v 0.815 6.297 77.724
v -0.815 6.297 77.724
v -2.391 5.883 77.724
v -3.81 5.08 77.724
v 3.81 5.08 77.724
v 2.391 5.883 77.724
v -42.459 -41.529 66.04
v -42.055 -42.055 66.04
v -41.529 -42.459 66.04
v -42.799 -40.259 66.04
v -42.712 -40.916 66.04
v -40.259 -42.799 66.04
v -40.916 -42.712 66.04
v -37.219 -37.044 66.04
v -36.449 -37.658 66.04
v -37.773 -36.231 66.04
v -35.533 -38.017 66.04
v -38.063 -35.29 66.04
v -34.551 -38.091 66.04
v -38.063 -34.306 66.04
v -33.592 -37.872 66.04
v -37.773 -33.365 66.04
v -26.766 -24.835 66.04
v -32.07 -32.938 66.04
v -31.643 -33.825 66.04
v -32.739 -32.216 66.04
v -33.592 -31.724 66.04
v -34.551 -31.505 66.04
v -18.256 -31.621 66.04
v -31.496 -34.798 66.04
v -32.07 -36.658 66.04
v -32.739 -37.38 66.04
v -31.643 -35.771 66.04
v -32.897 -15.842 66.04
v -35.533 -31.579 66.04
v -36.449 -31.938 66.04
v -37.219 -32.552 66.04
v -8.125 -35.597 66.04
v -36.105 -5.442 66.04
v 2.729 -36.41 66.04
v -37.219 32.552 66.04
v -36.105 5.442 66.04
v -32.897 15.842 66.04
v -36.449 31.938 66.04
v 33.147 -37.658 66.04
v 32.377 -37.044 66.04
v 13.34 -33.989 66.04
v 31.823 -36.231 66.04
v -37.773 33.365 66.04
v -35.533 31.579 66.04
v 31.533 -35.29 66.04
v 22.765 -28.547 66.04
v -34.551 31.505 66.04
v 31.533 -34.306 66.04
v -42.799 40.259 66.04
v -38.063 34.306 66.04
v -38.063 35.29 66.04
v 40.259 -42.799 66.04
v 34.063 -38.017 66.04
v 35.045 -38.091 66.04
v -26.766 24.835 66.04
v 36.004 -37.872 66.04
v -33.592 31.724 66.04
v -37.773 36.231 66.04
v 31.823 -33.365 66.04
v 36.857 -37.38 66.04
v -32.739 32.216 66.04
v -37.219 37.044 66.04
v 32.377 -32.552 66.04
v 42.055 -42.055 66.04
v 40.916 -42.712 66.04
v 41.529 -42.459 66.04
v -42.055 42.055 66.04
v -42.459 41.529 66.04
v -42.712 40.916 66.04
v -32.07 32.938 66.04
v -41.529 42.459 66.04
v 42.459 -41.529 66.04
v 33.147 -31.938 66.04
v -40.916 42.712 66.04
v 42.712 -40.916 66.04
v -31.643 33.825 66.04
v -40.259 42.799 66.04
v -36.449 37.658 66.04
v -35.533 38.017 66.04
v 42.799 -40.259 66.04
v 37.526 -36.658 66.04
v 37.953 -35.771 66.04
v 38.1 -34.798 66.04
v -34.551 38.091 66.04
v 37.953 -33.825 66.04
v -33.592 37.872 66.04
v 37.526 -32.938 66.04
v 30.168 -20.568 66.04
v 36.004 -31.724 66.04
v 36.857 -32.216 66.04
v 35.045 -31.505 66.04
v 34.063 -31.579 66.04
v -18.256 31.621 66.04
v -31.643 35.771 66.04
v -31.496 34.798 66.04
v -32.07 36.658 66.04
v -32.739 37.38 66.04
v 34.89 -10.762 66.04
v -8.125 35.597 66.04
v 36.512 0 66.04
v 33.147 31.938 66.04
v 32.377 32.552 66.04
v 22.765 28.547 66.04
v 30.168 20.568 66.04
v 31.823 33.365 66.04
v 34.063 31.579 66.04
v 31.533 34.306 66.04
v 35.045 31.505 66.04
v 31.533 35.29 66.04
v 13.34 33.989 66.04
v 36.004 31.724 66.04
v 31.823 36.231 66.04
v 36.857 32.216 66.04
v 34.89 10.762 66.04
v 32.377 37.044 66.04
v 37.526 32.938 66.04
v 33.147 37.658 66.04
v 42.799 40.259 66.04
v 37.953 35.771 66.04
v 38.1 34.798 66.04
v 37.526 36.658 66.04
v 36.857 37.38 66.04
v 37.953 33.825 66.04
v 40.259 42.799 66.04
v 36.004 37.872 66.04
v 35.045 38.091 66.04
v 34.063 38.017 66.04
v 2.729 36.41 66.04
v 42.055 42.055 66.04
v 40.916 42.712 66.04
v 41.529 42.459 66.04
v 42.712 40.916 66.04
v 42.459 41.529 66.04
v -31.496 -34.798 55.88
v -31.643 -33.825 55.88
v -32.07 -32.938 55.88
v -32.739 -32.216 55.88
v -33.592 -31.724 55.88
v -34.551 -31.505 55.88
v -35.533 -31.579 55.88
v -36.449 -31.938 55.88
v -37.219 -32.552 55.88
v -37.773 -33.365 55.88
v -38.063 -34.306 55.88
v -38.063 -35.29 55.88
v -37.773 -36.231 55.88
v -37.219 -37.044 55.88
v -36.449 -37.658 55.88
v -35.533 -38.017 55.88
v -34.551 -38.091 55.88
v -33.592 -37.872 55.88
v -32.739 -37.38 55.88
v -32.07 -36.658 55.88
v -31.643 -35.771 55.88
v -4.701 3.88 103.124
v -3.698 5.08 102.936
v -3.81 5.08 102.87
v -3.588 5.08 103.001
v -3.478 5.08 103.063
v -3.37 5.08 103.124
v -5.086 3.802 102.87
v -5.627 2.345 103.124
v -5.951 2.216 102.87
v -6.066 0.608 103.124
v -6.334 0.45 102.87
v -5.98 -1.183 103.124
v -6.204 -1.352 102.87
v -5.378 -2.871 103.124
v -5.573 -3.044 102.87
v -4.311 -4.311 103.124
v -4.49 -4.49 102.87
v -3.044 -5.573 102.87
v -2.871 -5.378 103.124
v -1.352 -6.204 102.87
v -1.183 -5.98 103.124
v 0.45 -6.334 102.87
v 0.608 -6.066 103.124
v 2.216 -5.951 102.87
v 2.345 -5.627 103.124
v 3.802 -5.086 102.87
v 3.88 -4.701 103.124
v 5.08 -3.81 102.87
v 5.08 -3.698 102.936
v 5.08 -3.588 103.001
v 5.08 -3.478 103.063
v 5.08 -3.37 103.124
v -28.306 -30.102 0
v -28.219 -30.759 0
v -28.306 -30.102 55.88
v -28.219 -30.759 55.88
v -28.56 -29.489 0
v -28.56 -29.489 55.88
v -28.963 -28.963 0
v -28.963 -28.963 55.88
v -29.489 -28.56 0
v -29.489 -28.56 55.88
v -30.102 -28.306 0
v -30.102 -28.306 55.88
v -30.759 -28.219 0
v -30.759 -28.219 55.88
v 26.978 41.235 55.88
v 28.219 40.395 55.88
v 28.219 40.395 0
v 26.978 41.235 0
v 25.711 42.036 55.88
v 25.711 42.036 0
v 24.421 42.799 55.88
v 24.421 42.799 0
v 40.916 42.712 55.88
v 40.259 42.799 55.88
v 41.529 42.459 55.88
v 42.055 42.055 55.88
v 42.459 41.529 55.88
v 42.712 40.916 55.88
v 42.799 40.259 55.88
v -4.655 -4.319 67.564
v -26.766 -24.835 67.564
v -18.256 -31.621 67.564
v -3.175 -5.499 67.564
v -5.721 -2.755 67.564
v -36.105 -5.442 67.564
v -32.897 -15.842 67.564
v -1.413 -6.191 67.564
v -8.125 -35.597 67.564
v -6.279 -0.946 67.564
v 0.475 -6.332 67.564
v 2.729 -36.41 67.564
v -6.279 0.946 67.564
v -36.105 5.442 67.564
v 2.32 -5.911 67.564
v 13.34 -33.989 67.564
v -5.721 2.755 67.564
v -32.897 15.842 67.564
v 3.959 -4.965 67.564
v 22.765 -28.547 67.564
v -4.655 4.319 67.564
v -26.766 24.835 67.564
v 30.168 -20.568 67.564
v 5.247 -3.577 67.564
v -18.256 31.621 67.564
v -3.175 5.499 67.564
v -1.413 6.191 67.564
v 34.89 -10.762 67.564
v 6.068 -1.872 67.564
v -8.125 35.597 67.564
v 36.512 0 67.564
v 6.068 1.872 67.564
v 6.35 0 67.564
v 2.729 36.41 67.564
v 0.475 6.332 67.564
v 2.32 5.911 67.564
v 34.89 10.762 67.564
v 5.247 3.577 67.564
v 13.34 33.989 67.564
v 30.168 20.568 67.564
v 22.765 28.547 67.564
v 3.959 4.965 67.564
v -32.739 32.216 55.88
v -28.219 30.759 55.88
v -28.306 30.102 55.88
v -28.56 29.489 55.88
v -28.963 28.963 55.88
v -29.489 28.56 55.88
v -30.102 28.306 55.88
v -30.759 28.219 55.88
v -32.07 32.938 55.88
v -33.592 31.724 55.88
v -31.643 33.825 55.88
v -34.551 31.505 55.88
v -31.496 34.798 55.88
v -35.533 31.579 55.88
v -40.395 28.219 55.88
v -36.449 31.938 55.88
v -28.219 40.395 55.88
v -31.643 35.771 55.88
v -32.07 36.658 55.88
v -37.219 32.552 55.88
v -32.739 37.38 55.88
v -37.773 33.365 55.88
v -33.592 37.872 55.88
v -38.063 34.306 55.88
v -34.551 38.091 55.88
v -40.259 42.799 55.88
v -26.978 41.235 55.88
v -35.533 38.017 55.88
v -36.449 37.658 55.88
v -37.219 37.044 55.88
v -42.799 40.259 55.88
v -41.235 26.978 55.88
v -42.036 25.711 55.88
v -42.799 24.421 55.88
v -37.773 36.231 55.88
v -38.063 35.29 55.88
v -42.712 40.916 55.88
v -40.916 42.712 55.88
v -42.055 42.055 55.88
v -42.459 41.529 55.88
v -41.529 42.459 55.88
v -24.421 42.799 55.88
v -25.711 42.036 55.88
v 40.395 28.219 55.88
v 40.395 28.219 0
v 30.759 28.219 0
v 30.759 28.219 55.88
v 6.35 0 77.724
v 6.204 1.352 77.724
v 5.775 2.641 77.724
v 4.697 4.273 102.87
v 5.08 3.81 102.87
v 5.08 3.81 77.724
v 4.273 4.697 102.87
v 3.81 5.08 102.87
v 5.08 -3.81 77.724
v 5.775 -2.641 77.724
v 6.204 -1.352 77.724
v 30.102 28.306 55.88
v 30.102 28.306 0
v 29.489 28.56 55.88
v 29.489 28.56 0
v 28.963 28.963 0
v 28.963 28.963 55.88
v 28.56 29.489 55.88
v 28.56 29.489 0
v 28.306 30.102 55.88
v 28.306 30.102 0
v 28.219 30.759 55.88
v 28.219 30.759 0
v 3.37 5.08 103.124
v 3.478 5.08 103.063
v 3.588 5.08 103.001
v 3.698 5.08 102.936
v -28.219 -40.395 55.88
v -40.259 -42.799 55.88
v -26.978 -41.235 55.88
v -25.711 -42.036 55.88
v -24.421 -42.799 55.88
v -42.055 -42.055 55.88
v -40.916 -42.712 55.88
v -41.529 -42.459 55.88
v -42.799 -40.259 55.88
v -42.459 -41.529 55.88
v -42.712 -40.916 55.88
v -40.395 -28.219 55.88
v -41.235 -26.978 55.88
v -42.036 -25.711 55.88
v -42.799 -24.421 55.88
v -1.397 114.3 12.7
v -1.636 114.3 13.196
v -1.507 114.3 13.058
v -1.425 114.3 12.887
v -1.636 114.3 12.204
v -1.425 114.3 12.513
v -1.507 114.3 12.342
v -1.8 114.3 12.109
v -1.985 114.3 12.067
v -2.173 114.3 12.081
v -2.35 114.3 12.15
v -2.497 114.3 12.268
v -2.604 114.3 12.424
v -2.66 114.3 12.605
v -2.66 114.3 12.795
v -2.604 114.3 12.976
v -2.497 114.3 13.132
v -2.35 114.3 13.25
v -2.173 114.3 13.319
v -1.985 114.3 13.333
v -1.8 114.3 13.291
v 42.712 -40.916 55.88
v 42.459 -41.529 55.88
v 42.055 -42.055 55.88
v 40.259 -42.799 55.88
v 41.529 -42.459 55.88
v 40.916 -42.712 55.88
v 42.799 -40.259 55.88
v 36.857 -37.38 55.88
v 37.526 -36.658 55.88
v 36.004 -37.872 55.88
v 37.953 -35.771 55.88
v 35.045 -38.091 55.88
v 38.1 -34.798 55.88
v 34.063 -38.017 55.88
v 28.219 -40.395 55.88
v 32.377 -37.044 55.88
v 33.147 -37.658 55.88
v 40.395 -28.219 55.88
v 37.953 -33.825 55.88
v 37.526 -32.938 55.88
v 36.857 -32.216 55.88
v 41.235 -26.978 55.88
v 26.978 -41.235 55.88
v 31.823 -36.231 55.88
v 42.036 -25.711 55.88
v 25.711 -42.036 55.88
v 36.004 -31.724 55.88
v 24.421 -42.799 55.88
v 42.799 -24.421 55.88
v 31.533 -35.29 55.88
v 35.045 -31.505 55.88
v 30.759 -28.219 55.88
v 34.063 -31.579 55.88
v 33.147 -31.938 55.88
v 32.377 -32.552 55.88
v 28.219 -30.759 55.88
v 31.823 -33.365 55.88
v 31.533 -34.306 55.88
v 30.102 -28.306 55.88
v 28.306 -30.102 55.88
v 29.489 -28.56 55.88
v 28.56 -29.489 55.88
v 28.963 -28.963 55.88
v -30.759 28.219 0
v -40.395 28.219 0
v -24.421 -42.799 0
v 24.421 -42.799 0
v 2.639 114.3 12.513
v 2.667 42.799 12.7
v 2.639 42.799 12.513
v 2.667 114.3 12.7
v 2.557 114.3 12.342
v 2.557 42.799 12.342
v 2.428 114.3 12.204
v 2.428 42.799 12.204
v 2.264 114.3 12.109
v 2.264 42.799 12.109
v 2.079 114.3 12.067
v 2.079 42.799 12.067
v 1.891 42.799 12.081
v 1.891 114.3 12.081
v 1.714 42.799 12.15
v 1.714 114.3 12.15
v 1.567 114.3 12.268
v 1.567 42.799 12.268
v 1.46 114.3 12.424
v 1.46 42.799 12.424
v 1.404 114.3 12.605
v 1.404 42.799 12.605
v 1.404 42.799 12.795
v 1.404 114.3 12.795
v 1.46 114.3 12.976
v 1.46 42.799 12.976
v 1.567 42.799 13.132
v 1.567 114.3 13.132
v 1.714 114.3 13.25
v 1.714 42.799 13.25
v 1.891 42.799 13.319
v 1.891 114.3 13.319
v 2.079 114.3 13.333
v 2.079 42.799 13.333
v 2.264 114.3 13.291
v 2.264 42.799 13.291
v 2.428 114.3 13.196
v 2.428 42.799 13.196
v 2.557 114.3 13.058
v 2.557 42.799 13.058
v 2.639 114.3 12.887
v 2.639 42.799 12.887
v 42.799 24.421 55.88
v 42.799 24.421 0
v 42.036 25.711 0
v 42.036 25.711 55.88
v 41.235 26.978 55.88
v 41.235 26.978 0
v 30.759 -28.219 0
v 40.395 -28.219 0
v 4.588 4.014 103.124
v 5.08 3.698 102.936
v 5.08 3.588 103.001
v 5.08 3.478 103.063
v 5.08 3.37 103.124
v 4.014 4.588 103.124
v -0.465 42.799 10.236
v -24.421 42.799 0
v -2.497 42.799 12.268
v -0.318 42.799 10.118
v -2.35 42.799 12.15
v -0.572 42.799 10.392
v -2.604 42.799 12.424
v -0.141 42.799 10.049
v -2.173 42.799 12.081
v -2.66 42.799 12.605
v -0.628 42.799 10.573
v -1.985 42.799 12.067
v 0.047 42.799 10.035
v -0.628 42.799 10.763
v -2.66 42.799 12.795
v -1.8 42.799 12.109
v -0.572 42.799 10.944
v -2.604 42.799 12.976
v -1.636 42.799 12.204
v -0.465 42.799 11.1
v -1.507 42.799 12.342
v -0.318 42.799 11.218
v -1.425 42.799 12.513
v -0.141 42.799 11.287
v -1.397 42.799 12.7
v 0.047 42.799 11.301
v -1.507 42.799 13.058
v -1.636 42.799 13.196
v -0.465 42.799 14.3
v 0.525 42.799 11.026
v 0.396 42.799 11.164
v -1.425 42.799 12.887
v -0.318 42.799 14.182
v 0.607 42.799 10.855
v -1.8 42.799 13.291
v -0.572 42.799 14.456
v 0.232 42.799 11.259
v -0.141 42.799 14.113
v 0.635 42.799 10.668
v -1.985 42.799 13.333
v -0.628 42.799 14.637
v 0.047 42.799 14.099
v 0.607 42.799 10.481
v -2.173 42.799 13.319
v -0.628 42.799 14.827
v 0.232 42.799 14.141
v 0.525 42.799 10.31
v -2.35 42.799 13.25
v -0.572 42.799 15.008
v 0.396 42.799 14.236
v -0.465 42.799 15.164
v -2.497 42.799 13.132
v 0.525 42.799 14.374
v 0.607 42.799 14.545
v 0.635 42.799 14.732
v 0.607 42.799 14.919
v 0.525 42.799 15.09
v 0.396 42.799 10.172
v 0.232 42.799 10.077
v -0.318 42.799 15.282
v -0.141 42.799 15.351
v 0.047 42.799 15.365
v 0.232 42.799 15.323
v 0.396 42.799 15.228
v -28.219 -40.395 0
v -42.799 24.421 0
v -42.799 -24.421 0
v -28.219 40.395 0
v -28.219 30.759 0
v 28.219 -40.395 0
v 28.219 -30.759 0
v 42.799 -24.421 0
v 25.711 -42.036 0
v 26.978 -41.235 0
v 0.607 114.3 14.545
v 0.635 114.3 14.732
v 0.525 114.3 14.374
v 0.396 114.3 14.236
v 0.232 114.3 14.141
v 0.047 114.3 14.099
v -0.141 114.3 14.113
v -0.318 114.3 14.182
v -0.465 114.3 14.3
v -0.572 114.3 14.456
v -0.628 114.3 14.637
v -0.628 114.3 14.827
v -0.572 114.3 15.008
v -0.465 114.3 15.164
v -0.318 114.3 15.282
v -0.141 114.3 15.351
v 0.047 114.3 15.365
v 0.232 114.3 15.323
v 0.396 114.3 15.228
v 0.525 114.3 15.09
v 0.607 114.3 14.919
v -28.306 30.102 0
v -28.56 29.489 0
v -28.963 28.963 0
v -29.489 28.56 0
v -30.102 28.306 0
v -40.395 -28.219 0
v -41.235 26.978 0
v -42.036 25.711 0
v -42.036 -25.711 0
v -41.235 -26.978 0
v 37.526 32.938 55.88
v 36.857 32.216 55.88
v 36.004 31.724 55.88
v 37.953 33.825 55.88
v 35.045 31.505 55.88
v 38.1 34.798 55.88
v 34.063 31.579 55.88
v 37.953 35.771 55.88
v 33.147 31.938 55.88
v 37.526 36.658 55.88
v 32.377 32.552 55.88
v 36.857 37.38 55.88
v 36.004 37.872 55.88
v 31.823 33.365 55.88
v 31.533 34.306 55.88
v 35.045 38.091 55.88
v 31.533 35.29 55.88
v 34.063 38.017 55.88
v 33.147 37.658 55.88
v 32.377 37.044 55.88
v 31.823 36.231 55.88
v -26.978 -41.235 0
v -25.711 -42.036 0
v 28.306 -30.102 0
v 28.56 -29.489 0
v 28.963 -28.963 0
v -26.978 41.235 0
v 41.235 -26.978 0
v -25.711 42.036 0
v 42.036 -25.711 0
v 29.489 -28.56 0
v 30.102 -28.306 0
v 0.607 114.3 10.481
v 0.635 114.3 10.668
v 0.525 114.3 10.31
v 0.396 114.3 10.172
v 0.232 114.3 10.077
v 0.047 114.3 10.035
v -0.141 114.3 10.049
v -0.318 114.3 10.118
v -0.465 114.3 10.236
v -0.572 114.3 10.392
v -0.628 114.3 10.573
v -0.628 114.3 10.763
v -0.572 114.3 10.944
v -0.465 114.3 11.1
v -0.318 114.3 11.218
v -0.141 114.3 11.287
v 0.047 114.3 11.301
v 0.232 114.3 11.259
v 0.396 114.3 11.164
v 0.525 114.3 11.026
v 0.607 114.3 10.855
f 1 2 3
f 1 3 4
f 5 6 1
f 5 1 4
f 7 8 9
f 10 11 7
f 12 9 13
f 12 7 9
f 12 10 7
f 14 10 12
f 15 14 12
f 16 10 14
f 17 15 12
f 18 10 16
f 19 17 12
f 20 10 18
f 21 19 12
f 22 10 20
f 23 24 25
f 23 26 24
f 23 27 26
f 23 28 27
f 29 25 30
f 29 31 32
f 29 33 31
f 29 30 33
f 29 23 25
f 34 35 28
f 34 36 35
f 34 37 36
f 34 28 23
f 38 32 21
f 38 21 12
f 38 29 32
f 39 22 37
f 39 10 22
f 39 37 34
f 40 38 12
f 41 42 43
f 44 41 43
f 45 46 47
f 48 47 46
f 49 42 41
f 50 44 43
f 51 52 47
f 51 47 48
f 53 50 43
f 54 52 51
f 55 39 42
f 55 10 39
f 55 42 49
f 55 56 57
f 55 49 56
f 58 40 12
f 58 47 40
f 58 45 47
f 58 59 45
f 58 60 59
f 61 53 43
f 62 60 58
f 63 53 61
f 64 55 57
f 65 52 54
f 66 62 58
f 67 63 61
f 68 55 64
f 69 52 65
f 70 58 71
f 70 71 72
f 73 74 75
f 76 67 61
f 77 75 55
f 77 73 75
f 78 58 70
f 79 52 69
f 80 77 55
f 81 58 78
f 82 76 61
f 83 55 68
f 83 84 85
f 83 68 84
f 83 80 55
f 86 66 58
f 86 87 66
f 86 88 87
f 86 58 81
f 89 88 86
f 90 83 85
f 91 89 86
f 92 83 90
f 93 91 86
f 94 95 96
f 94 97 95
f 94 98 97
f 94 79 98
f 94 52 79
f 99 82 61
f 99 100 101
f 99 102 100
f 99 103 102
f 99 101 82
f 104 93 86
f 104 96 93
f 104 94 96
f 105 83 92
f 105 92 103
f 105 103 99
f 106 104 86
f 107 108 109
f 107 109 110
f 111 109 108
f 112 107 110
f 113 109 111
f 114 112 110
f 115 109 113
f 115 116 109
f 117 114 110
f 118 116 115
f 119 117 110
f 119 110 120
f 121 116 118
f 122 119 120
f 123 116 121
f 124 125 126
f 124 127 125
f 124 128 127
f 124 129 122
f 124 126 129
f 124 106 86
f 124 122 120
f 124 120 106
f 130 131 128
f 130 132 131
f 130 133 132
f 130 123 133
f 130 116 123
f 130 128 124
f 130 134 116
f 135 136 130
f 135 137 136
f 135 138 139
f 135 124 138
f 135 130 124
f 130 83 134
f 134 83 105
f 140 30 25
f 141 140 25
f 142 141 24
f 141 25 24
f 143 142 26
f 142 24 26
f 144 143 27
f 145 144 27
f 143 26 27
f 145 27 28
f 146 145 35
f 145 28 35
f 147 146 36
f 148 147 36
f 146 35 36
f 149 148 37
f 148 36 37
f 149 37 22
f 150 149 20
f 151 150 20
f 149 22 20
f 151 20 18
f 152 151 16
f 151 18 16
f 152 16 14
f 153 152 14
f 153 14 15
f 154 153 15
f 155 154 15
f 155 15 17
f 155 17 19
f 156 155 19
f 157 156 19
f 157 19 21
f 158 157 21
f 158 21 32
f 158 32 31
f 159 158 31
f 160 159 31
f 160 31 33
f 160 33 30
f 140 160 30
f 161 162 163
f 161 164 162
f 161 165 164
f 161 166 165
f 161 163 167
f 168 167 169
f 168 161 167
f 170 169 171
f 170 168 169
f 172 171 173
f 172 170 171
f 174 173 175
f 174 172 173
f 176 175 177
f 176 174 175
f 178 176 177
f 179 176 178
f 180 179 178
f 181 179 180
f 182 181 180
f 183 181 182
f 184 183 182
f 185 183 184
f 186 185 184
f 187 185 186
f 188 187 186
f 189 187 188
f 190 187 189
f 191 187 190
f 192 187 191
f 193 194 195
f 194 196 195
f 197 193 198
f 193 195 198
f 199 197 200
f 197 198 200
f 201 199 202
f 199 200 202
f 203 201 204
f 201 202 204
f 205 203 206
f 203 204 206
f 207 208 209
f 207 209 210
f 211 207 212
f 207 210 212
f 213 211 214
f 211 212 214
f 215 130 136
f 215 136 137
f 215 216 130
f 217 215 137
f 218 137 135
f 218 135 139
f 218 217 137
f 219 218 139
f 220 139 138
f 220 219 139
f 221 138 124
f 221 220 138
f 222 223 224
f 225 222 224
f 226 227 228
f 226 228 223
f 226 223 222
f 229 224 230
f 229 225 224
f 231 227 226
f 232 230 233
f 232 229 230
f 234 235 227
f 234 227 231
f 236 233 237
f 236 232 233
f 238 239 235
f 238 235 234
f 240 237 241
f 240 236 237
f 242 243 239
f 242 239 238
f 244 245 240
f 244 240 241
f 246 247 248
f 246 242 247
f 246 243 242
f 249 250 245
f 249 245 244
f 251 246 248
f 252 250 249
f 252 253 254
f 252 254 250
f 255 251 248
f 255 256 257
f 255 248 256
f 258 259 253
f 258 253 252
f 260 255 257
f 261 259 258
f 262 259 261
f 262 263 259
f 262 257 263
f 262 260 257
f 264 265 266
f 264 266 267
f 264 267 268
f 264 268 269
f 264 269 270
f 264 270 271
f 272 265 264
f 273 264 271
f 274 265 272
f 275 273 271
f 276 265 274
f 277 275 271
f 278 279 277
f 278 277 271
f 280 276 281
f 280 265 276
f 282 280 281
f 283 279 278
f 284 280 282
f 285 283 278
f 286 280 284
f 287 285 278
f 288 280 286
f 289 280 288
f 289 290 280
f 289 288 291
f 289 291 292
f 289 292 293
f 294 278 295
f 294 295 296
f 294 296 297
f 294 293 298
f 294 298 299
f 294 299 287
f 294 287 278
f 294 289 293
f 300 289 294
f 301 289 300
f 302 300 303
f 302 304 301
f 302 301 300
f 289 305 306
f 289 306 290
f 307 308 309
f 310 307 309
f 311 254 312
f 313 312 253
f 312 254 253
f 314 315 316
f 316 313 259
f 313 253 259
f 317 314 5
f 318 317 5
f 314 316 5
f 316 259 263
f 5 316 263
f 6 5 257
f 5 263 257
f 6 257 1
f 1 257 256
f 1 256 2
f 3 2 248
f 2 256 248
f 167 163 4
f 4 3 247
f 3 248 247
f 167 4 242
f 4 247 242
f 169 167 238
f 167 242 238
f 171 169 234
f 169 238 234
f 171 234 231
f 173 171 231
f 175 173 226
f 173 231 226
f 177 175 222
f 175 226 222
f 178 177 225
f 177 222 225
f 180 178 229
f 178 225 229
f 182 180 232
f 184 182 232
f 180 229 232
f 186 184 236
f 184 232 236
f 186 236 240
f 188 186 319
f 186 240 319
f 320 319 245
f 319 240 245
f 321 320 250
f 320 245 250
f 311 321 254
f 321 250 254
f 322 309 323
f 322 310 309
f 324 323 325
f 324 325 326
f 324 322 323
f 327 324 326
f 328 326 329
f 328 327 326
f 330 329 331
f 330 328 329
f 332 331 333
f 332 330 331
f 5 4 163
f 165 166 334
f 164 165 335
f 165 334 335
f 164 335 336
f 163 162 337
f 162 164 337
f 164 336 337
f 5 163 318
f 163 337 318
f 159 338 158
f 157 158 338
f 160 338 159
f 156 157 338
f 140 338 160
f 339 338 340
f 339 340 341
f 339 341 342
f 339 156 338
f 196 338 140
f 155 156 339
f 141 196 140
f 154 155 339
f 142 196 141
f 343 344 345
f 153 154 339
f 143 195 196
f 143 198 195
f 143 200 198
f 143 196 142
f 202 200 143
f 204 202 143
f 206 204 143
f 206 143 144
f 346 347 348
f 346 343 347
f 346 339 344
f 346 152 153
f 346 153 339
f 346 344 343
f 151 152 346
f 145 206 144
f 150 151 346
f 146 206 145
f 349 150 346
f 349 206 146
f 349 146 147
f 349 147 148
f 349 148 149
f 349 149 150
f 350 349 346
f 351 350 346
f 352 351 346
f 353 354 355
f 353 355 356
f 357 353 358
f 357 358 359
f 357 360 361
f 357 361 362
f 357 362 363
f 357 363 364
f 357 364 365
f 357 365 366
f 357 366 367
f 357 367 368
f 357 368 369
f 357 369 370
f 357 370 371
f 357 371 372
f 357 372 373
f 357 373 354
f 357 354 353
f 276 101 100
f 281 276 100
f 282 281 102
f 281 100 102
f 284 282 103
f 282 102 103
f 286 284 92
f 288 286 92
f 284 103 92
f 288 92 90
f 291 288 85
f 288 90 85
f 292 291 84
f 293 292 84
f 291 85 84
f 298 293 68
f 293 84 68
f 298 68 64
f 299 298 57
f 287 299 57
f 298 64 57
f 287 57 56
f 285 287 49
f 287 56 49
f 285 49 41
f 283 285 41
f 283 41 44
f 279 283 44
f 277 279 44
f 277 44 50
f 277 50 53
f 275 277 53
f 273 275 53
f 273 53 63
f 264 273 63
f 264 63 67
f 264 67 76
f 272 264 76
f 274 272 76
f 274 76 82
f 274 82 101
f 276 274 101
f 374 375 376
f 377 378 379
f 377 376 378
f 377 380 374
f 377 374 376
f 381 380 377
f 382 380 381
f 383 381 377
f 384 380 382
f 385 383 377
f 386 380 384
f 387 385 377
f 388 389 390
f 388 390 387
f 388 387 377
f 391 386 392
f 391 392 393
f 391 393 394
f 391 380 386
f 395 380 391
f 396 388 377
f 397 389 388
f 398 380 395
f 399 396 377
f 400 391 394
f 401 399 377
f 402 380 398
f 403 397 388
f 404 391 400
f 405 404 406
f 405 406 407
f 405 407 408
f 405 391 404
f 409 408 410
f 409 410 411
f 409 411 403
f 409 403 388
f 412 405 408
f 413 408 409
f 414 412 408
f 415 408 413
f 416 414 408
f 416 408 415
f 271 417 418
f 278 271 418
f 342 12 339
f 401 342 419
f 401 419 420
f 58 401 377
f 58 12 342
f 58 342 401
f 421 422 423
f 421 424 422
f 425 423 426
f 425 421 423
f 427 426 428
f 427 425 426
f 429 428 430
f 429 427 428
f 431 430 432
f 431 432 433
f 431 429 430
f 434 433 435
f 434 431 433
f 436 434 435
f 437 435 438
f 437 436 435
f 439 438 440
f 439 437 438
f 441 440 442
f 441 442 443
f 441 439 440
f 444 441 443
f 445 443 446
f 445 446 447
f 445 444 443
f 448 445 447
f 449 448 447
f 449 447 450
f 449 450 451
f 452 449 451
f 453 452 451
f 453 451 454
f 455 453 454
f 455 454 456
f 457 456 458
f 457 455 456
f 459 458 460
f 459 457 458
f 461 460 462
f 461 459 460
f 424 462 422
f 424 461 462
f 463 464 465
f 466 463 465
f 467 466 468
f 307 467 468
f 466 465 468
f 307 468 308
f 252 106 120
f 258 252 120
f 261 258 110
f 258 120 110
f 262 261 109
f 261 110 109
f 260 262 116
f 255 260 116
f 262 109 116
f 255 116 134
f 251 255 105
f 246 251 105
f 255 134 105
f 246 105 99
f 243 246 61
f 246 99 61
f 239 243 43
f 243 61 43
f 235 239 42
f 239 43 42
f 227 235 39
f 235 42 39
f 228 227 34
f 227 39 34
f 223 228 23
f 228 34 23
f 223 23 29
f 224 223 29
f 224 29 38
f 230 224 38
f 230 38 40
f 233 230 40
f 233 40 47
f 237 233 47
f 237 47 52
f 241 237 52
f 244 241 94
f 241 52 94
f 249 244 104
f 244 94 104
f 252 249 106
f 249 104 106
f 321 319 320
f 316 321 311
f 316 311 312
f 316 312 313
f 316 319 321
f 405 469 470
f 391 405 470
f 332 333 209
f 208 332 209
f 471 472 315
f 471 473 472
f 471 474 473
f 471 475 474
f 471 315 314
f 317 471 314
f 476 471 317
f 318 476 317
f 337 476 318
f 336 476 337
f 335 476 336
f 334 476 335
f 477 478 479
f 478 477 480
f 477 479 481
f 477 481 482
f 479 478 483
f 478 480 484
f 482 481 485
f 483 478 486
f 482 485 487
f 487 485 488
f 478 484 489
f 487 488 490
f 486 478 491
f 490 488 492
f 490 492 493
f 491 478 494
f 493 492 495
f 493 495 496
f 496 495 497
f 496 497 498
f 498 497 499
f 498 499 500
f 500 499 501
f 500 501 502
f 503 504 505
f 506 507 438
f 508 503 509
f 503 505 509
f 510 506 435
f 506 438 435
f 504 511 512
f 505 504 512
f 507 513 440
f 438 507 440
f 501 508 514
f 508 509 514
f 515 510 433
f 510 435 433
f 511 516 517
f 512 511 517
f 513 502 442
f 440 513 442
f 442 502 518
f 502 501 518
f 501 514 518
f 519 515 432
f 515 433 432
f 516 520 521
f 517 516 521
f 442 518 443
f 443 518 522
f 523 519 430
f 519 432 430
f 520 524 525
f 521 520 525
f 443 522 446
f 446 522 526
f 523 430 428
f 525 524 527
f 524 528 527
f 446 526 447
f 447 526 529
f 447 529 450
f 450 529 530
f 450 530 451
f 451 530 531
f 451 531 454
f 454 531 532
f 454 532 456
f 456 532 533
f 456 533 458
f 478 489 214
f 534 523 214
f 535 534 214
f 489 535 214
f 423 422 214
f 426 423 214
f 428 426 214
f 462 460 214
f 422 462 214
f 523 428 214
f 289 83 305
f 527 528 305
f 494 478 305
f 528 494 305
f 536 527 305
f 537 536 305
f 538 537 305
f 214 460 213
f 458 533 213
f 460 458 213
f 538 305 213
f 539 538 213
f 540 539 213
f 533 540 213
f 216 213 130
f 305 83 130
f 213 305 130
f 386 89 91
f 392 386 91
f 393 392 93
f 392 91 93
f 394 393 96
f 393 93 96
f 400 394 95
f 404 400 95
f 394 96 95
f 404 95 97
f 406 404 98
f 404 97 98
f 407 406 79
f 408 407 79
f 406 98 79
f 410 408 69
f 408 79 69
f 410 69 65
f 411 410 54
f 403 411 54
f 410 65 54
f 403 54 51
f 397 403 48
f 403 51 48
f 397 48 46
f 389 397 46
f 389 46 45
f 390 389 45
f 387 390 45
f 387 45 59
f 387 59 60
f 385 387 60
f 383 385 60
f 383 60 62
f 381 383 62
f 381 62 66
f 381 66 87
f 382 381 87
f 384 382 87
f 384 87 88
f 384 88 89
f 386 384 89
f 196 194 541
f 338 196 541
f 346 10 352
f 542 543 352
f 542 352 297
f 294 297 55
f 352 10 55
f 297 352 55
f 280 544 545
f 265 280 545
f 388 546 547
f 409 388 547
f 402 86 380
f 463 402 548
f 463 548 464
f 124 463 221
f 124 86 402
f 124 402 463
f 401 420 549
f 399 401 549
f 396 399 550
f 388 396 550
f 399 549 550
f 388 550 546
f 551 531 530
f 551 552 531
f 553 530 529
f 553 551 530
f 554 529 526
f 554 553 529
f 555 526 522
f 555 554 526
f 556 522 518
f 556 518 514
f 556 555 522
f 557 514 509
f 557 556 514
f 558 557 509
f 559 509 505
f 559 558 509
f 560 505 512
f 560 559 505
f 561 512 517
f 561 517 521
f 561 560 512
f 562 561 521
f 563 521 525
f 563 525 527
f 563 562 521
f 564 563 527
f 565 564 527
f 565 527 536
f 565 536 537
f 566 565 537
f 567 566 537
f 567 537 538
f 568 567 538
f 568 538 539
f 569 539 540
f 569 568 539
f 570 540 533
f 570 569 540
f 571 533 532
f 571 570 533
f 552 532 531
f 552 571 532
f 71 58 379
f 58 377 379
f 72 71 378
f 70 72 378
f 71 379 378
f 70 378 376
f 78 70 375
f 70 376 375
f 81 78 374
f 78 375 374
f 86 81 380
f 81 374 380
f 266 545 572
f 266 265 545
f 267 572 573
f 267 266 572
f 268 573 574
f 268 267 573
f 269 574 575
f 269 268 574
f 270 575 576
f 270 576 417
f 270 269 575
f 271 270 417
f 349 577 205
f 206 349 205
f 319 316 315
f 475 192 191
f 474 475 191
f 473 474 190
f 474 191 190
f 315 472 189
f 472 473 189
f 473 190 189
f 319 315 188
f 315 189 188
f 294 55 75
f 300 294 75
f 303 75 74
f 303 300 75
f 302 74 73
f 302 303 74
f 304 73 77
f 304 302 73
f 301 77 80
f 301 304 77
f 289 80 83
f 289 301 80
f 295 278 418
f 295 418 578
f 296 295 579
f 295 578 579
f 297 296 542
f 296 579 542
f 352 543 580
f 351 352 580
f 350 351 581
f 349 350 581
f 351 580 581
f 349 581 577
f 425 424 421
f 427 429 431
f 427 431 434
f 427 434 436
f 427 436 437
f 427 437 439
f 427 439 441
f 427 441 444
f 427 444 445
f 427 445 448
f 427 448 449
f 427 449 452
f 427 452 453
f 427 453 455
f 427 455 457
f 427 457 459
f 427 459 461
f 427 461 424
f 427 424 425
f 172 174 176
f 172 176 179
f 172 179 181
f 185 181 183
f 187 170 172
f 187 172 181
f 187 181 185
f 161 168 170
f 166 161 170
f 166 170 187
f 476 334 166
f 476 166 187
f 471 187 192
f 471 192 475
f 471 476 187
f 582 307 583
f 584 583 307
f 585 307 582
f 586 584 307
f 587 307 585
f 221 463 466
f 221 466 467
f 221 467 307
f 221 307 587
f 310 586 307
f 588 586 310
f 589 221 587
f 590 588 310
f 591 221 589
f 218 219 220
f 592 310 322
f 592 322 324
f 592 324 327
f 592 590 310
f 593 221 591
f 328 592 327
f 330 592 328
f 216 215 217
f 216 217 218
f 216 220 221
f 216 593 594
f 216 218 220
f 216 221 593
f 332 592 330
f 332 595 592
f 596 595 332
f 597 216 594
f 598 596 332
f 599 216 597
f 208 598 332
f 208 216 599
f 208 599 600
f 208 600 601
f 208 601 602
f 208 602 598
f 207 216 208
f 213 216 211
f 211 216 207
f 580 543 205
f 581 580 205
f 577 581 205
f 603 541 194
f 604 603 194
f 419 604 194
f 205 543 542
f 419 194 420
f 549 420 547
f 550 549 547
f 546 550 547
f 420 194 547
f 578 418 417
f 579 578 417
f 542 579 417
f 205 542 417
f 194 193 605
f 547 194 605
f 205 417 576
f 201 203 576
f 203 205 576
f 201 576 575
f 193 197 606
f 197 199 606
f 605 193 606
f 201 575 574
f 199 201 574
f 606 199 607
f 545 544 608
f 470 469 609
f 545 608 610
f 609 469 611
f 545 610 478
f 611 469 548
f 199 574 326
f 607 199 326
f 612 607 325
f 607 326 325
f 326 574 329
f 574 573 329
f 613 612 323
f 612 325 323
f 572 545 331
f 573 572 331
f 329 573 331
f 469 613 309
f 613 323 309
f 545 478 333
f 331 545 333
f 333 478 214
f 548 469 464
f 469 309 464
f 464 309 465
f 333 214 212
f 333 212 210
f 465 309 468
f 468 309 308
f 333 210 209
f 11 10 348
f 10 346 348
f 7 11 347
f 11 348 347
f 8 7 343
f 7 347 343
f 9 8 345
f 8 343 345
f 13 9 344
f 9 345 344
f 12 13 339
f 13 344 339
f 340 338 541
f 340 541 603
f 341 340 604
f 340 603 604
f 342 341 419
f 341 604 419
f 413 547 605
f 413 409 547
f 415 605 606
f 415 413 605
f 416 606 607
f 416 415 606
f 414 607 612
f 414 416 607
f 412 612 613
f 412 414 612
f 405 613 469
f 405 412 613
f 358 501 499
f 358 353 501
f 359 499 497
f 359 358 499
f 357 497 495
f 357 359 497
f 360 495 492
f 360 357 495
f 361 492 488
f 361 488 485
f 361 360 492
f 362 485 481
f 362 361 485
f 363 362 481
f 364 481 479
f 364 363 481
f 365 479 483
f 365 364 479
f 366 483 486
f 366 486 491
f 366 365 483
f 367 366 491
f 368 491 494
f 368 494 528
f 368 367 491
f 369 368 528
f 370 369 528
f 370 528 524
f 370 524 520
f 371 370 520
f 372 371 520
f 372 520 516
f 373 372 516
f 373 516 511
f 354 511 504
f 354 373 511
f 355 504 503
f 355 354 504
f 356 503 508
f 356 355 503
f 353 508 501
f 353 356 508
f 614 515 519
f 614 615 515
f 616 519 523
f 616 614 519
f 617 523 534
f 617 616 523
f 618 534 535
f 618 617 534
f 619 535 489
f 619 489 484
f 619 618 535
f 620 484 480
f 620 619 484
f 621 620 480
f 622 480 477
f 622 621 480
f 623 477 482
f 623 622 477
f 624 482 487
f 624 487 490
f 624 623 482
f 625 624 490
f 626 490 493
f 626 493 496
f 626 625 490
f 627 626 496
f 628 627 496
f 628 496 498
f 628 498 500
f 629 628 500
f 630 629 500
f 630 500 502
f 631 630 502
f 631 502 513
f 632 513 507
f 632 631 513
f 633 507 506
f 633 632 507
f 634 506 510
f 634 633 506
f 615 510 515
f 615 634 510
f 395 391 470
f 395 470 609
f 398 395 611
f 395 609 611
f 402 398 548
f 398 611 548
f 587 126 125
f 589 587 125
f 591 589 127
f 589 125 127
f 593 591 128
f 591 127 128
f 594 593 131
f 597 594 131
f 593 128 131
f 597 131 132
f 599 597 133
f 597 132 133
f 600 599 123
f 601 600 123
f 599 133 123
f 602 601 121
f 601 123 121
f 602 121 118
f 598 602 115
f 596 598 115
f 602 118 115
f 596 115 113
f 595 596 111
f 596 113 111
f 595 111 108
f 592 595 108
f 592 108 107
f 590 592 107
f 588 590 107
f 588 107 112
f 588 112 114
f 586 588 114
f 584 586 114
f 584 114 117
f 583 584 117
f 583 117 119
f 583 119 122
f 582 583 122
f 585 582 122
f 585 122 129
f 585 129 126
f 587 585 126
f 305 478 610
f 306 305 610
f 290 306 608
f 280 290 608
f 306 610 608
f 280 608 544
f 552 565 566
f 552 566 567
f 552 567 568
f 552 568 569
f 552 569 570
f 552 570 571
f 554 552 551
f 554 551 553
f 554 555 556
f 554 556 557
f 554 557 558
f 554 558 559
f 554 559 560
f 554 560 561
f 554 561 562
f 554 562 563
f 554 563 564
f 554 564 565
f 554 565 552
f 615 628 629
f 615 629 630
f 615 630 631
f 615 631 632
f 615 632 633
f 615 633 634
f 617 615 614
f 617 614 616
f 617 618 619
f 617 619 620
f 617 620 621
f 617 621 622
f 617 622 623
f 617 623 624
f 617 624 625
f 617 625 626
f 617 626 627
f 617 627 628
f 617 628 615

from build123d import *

# Parameters (mm, degrees)
SKETCH1_W           = 85.598
SKETCH1_H           = 85.598
BOSS_EXTRUDE1_DEPTH = 66.04
CUT_EXTRUDE1_DEPTH  = 55.88
CUT_EXTRUDE2_DEPTH  = 55.88
CUT_EXTRUDE3_DEPTH  = 55.88
CUT_EXTRUDE4_DEPTH  = 55.88
CUT_EXTRUDE5_DEPTH  = 55.88
CUT_EXTRUDE6_DEPTH  = 55.88
CUT_EXTRUDE7_DEPTH  = 55.88
CUT_EXTRUDE8_DEPTH  = 55.88
SKETCH10_R          = 36.5125
BOSS_EXTRUDE2_DEPTH = 1.524
SKETCH11_R          = 6.35
BOSS_EXTRUDE3_DEPTH = 35.56
CUT_EXTRUDE9_DEPTH  = 25.4
CUT_EXTRUDE10_DEPTH = 25.4
SKETCH14_W          = 0.635
SKETCH14_H          = 71.501
SKETCH15_W          = 0.635
SKETCH15_H          = 71.501
SKETCH16_W          = 0.635
SKETCH16_H          = 71.501
SKETCH17_W          = 0.635
SKETCH17_H          = 71.501
HOLE1_D             = 6.604
HOLE1_DEPTH         = 47.244
HOLE2_D             = 6.604
HOLE2_DEPTH         = 47.244
HOLE3_D             = 6.604
HOLE3_DEPTH         = 47.244
HOLE4_D             = 6.604
HOLE4_DEPTH         = 47.244
CHAMFER1_SIZE       = 0.254
CHAMFER2_SIZE       = 0.254
FILLET1_R           = 2.54
FILLET2_R           = 2.54
FILLET3_R           = 2.54
FILLET4_R           = 2.54
FILLET5_R           = 2.54
FILLET6_R           = 2.54
FILLET7_R           = 2.54
FILLET8_R           = 2.54


with BuildPart() as part:
    # Sketch1 → Boss-Extrude1 (new body)
    with BuildSketch(Plane.XY.offset(66.04)):
        Rectangle(SKETCH1_W, SKETCH1_H)
    extrude(amount=-BOSS_EXTRUDE1_DEPTH)

    # Sketch2 → Cut-Extrude1 (cut)
    with BuildSketch(Plane(origin=(0, 0, 0), x_dir=(-1, 0, 0), z_dir=(0, 0, -1))):
        with BuildLine():
            Line((-42.799, -42.799), (-24.420683344, -42.799))
            ThreePointArc((-24.420683344, -42.799), (-34.84339375, -34.84339375), (-42.799, -24.420683344))
            Line((-42.799, -24.420683344), (-42.799, -42.799))
        make_face()
    extrude(amount=-CUT_EXTRUDE1_DEPTH, mode=Mode.SUBTRACT)

    # Sketch3 → Cut-Extrude2 (cut)
    with BuildSketch(Plane(origin=(0, 0, 0), x_dir=(-1, 0, 0), z_dir=(0, 0, -1))):
        with BuildLine():
            Line((-28.2194, -40.395416072), (-28.2194, -28.2194))
            Line((-28.2194, -28.2194), (-40.395416072, -28.2194))
            ThreePointArc((-40.395416072, -28.2194), (-34.84339375, -34.84339375), (-28.2194, -40.395416072))
        make_face()
    extrude(amount=-CUT_EXTRUDE2_DEPTH, mode=Mode.SUBTRACT)

    # Sketch4 → Cut-Extrude3 (cut)
    with BuildSketch(Plane(origin=(0, 0, 0), x_dir=(-1, 0, 0), z_dir=(0, 0, -1))):
        with BuildLine():
            Line((-42.799, 42.799), (-42.799, 24.420683344))
            ThreePointArc((-42.799, 24.420683344), (-34.84339375, 34.84339375), (-24.420683344, 42.799))
            Line((-24.420683344, 42.799), (-42.799, 42.799))
        make_face()
    extrude(amount=-CUT_EXTRUDE3_DEPTH, mode=Mode.SUBTRACT)

    # Sketch5 → Cut-Extrude4 (cut)
    with BuildSketch(Plane(origin=(0, 0, 0), x_dir=(-1, 0, 0), z_dir=(0, 0, -1))):
        with BuildLine():
            Line((-40.395416072, 28.2194), (-28.2194, 28.2194))
            Line((-28.2194, 28.2194), (-28.2194, 40.395416072))
            ThreePointArc((-28.2194, 40.395416072), (-34.84339375, 34.84339375), (-40.395416072, 28.2194))
        make_face()
    extrude(amount=-CUT_EXTRUDE4_DEPTH, mode=Mode.SUBTRACT)

    # Sketch6 → Cut-Extrude5 (cut)
    with BuildSketch(Plane(origin=(0, 0, 0), x_dir=(-1, 0, 0), z_dir=(0, 0, -1))):
        with BuildLine():
            Line((42.799, 42.799), (24.420683344, 42.799))
            ThreePointArc((24.420683344, 42.799), (34.84339375, 34.84339375), (42.799, 24.420683344))
            Line((42.799, 24.420683344), (42.799, 42.799))
        make_face()
    extrude(amount=-CUT_EXTRUDE5_DEPTH, mode=Mode.SUBTRACT)

    # Sketch7 → Cut-Extrude6 (cut)
    with BuildSketch(Plane(origin=(0, 0, 0), x_dir=(-1, 0, 0), z_dir=(0, 0, -1))):
        with BuildLine():
            Line((28.2194, 40.395416072), (28.2194, 28.2194))
            Line((28.2194, 28.2194), (40.395416072, 28.2194))
            ThreePointArc((40.395416072, 28.2194), (34.84339375, 34.84339375), (28.2194, 40.395416072))
        make_face()
    extrude(amount=-CUT_EXTRUDE6_DEPTH, mode=Mode.SUBTRACT)

    # Sketch8 → Cut-Extrude7 (cut)
    with BuildSketch(Plane(origin=(0, 0, 0), x_dir=(-1, 0, 0), z_dir=(0, 0, -1))):
        with BuildLine():
            Line((42.799, -42.799), (42.799, -24.420683344))
            ThreePointArc((42.799, -24.420683344), (34.84339375, -34.84339375), (24.420683344, -42.799))
            Line((24.420683344, -42.799), (42.799, -42.799))
        make_face()
    extrude(amount=-CUT_EXTRUDE7_DEPTH, mode=Mode.SUBTRACT)

    # Sketch9 → Cut-Extrude8 (cut)
    with BuildSketch(Plane(origin=(0, 0, 0), x_dir=(-1, 0, 0), z_dir=(0, 0, -1))):
        with BuildLine():
            Line((40.395416072, -28.2194), (28.2194, -28.2194))
            Line((28.2194, -28.2194), (28.2194, -40.395416072))
            ThreePointArc((28.2194, -40.395416072), (34.84339375, -34.84339375), (40.395416072, -28.2194))
        make_face()
    extrude(amount=-CUT_EXTRUDE8_DEPTH, mode=Mode.SUBTRACT)

    # Sketch10 → Boss-Extrude2 (add)
    with BuildSketch(Plane.XY.offset(66.04)):
        Circle(SKETCH10_R)
    extrude(amount=BOSS_EXTRUDE2_DEPTH)

    # Sketch11 → Boss-Extrude3 (add)
    with BuildSketch(Plane.XY.offset(67.564)):
        Circle(SKETCH11_R)
    extrude(amount=BOSS_EXTRUDE3_DEPTH)

    # Sketch12 → Cut-Extrude9 (cut)
    with BuildSketch(Plane.XY.offset(103.124)):
        with BuildLine():
            Line((-3.81, 5.08), (3.81, 5.08))
            ThreePointArc((3.81, 5.08), (0, 6.35), (-3.81, 5.08))
        make_face()
    extrude(amount=-CUT_EXTRUDE9_DEPTH, mode=Mode.SUBTRACT)

    # Sketch13 → Cut-Extrude10 (cut)
    with BuildSketch(Plane.XY.offset(103.124)):
        with BuildLine():
            Line((5.08, 3.81), (5.08, -3.81))
            ThreePointArc((5.08, -3.81), (6.35, 0), (5.08, 3.81))
        make_face()
    extrude(amount=-CUT_EXTRUDE10_DEPTH, mode=Mode.SUBTRACT)

    # Sketch14 → Revolve1 (revolve)
    with BuildSketch(Plane(origin=(0, 0, 12.7), x_dir=(-1, 0, 0), z_dir=(0, 0, -1))):
        with Locations((1.7145, 78.5495)):
            Rectangle(SKETCH14_W, SKETCH14_H)
    revolve(axis=Axis((-2.032, 42.799, 12.7), (0, 1, 0)))

    # Sketch15 → Revolve2 (revolve)
    with BuildSketch(Plane(origin=(0, 0, 12.7), x_dir=(-1, 0, 0), z_dir=(0, 0, -1))):
        with Locations((-2.3495, 78.5495)):
            Rectangle(SKETCH15_W, SKETCH15_H)
    revolve(axis=Axis((2.032, 42.799, 12.7), (0, 1, 0)))

    # Sketch16 → Revolve3 (revolve)
    with BuildSketch(Plane(origin=(0, 0, 14.732), x_dir=(-1, 0, 0), z_dir=(0, 0, -1))):
        with Locations((-0.3175, 78.5495)):
            Rectangle(SKETCH16_W, SKETCH16_H)
    revolve(axis=Axis((0, 42.799, 14.732), (0, 1, 0)))

    # Sketch17 → Revolve4 (revolve)
    with BuildSketch(Plane(origin=(0, 0, 10.668), x_dir=(-1, 0, 0), z_dir=(0, 0, -1))):
        with Locations((-0.3175, 78.5495)):
            Rectangle(SKETCH17_W, SKETCH17_H)
    revolve(axis=Axis((0, 42.799, 10.668), (0, 1, 0)))

    # Hole1
    with Locations(Plane(origin=(0, 0, 55.88), x_dir=(-1, 0, 0), z_dir=(0, 0, -1))):
        with Locations((34.798, -34.798)):
            Hole(HOLE1_D / 2, depth=HOLE1_DEPTH)

    # Hole2
    with Locations(Plane(origin=(0, 0, 55.88), x_dir=(-1, 0, 0), z_dir=(0, 0, -1))):
        with Locations((34.798, 34.798)):
            Hole(HOLE2_D / 2, depth=HOLE2_DEPTH)

    # Hole3
    with Locations(Plane(origin=(0, 0, 55.88), x_dir=(-1, 0, 0), z_dir=(0, 0, -1))):
        with Locations((-34.798, 34.798)):
            Hole(HOLE3_D / 2, depth=HOLE3_DEPTH)

    # Hole4
    with Locations(Plane(origin=(0, 0, 55.88), x_dir=(-1, 0, 0), z_dir=(0, 0, -1))):
        with Locations((-34.798, -34.798)):
            Hole(HOLE4_D / 2, depth=HOLE4_DEPTH)

    # Chamfer1
    chamfer1_edges = [part.edges().sort_by_distance(p)[0] for p in [
        (-4.490128061, -4.490128061, 103.124),
    ]]
    chamfer(chamfer1_edges, length=CHAMFER1_SIZE)

    # Chamfer2
    chamfer2_edges = [part.edges().sort_by_distance(p)[0] for p in [
        (4.490128061, 4.490128061, 103.124),
    ]]
    chamfer(chamfer2_edges, length=CHAMFER2_SIZE)

    # Fillet1
    fillet1_edges = [part.edges().sort_by_distance(p)[0] for p in [
        (-42.799, -42.799, 60.96),
    ]]
    fillet(fillet1_edges, radius=FILLET1_R)

    # Fillet2
    fillet2_edges = [part.edges().sort_by_distance(p)[0] for p in [
        (-42.799, 42.799, 60.96),
    ]]
    fillet(fillet2_edges, radius=FILLET2_R)

    # Fillet3
    fillet3_edges = [part.edges().sort_by_distance(p)[0] for p in [
        (42.799, 42.799, 60.96),
    ]]
    fillet(fillet3_edges, radius=FILLET3_R)

    # Fillet4
    fillet4_edges = [part.edges().sort_by_distance(p)[0] for p in [
        (-28.2194, 28.2194, 27.94),
    ]]
    fillet(fillet4_edges, radius=FILLET4_R)

    # Fillet5
    fillet5_edges = [part.edges().sort_by_distance(p)[0] for p in [
        (42.799, -42.799, 60.96),
    ]]
    fillet(fillet5_edges, radius=FILLET5_R)

    # Fillet6
    fillet6_edges = [part.edges().sort_by_distance(p)[0] for p in [
        (28.2194, -28.2194, 27.94),
    ]]
    fillet(fillet6_edges, radius=FILLET6_R)

    # Fillet7
    fillet7_edges = [part.edges().sort_by_distance(p)[0] for p in [
        (28.2194, 28.2194, 27.94),
    ]]
    fillet(fillet7_edges, radius=FILLET7_R)

    # Fillet8
    fillet8_edges = [part.edges().sort_by_distance(p)[0] for p in [
        (-28.2194, -28.2194, 27.94),
    ]]
    fillet(fillet8_edges, radius=FILLET8_R)


solid = part.part
